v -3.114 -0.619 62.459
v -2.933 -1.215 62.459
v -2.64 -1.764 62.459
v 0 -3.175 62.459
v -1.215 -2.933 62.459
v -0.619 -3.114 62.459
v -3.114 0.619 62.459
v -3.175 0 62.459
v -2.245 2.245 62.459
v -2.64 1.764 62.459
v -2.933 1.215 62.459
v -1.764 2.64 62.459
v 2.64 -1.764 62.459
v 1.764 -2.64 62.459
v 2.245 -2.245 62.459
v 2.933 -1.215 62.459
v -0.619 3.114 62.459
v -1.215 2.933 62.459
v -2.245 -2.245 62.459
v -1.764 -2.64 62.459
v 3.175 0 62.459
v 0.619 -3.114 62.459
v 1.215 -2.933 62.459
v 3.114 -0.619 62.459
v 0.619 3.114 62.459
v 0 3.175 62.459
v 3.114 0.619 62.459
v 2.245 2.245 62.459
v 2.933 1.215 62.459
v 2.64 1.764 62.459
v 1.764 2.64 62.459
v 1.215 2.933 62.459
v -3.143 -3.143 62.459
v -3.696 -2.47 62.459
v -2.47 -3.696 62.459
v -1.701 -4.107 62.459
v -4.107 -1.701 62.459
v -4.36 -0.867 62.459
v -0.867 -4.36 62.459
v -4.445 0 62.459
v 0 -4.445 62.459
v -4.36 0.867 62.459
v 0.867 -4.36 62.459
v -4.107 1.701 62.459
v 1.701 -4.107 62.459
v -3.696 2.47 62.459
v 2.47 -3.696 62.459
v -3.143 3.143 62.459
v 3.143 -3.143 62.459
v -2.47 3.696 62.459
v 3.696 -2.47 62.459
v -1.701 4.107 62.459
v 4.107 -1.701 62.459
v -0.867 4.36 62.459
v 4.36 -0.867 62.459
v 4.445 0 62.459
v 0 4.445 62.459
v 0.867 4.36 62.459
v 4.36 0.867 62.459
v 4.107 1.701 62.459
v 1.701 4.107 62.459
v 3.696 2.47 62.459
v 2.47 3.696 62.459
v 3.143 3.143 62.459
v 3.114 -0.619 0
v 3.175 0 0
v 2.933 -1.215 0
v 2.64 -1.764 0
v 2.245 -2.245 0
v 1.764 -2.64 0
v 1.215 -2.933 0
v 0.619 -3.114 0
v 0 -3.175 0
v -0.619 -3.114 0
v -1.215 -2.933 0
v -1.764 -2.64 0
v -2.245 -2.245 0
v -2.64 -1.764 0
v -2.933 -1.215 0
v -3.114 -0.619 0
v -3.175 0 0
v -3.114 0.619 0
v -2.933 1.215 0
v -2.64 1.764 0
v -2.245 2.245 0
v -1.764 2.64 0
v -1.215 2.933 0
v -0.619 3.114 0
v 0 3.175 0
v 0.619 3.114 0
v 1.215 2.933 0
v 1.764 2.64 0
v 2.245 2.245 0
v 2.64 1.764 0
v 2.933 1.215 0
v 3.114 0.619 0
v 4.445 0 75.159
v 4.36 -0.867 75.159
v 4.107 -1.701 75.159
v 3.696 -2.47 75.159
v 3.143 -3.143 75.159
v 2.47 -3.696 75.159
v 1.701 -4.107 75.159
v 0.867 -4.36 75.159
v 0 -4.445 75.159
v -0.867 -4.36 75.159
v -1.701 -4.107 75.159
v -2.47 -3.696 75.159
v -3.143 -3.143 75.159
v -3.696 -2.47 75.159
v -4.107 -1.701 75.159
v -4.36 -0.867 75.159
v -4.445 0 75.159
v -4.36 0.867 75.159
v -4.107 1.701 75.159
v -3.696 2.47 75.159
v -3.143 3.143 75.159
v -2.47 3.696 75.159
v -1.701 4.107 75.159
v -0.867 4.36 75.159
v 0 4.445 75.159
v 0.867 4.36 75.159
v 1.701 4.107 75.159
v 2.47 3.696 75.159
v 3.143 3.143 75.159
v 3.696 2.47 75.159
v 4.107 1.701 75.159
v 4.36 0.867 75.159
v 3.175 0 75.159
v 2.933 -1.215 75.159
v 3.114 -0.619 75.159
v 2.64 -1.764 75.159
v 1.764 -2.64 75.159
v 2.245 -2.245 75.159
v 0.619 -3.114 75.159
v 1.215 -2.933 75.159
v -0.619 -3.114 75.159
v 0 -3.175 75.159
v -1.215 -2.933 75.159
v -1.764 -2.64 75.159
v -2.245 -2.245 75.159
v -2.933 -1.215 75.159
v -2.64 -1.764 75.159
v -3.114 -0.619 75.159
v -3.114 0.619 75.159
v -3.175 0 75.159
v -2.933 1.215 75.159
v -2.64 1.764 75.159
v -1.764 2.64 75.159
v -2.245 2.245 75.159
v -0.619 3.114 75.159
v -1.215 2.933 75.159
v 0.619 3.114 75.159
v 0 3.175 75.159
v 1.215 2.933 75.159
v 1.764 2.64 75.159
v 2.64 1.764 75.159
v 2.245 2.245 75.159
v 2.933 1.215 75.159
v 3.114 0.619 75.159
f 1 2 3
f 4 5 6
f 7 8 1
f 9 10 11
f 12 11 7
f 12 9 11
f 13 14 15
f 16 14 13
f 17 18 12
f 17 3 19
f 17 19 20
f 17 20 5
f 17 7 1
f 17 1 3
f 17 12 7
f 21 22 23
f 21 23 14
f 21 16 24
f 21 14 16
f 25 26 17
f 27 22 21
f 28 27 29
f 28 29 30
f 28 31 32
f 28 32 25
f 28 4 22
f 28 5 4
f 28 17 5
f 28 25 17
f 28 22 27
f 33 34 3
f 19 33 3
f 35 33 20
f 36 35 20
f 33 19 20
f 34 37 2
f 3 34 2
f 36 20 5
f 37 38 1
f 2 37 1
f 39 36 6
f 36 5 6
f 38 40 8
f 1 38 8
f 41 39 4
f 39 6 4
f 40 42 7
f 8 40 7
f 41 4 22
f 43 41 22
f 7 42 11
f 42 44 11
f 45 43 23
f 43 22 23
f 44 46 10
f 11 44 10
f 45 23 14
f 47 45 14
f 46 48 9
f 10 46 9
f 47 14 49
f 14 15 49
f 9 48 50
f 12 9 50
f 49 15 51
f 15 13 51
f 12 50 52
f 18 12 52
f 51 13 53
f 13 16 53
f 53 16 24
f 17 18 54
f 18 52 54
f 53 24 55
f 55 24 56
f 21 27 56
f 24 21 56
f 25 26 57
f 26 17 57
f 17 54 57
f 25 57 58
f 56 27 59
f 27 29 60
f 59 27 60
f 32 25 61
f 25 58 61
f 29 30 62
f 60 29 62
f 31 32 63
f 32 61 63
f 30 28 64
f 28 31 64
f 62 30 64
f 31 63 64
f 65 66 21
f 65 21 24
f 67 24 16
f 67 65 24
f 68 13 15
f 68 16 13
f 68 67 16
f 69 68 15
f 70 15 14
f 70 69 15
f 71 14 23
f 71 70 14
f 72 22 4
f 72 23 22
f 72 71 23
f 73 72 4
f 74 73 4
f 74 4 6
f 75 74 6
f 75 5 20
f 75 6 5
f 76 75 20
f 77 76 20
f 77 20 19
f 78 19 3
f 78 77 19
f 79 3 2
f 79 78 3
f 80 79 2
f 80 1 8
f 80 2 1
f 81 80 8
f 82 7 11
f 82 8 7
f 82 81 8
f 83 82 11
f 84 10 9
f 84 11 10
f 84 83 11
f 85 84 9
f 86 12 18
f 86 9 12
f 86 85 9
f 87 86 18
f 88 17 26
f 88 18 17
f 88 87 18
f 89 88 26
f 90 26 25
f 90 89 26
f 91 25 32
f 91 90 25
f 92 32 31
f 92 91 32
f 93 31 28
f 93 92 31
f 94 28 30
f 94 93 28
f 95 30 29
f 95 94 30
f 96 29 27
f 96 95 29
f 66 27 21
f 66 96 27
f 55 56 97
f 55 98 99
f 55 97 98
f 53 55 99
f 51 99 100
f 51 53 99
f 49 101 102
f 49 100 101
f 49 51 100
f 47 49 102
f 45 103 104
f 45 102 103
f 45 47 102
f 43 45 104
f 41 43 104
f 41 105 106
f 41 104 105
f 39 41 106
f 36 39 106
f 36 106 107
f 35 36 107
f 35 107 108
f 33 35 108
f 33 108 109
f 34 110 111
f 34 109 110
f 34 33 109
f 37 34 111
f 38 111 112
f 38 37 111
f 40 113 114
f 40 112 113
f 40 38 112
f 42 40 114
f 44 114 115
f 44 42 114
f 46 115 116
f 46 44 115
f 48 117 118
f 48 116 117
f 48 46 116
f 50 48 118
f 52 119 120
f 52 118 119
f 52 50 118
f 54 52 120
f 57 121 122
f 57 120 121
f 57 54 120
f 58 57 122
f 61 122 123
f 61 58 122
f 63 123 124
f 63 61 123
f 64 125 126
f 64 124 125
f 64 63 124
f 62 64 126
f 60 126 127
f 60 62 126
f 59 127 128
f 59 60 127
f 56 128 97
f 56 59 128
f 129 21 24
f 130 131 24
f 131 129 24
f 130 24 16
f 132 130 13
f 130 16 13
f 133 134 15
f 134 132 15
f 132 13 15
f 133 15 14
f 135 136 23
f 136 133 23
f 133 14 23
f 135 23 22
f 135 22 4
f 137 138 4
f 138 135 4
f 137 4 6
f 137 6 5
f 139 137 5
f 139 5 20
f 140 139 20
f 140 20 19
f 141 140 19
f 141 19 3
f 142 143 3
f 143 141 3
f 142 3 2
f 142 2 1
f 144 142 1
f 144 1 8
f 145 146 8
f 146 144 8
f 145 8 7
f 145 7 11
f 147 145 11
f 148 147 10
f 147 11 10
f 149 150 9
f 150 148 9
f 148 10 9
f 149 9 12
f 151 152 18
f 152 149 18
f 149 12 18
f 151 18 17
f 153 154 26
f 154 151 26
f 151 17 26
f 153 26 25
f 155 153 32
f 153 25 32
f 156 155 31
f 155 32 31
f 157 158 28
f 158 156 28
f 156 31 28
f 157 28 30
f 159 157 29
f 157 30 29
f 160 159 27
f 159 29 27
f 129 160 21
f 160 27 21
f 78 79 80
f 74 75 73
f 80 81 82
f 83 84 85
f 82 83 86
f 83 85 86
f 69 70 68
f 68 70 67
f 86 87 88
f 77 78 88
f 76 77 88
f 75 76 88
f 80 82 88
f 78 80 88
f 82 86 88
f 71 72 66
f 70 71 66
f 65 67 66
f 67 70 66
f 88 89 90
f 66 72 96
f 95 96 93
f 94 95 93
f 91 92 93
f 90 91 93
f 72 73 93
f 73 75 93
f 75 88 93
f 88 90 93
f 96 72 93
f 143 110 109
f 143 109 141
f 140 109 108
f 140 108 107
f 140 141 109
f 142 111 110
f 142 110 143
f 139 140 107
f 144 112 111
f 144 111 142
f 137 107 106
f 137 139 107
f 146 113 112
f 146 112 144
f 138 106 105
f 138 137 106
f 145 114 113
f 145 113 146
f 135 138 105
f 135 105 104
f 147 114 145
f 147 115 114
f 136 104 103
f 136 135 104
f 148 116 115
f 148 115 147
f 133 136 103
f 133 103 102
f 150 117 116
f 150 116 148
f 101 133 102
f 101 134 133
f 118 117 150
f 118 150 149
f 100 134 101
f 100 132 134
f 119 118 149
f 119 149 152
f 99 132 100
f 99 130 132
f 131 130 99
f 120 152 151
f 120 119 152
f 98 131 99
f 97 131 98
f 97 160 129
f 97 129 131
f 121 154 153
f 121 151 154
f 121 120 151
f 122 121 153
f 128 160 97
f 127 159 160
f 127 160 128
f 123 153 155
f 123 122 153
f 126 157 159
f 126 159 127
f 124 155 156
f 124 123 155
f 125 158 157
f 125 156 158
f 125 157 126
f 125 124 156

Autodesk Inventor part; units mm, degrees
ref_plane "YZ Plane" through (0, 0, 0) normal (1, 0, 0) x (0, 1, 0)
ref_plane "XZ Plane" through (0, 0, 0) normal (0, 1, 0) x (-1, 0, 0)
ref_plane "XY Plane" through (0, 0, 0) normal (0, 0, 1) x (1, 0, 0)
sketch "Sketch1" plane through (0, 0, 0) normal (0, 0, 1) x (1, 0, 0)
  circle A0 centre (0, 0) radius 3.175
  dimension "d0" = 6.35
extrude "Extrusion1" add sketch "Sketch1" along normal blind 62.4586
thread "Thread1" size "1/4-20 UNC" class "2A" standard "ANSI Unified Screw Threads" full length
sketch "Sketch3" plane through (0, 0, 62.4586) normal (0, 0, 1) x (1, 0, 0)
  circle A0 centre (0, 0) radius 4.445
  circle A1 centre (0, 0) radius 3.175
  dimension "d8" = 8.89
  dimension "d9" = 6.35
extrude "Extrusion3" add sketch "Sketch3" along normal blind 12.7
thread "Thread2" size "1/4-20 UNC" class "2B" standard "ANSI Unified Screw Threads" full length
properties part number "Pedal Bolt"
